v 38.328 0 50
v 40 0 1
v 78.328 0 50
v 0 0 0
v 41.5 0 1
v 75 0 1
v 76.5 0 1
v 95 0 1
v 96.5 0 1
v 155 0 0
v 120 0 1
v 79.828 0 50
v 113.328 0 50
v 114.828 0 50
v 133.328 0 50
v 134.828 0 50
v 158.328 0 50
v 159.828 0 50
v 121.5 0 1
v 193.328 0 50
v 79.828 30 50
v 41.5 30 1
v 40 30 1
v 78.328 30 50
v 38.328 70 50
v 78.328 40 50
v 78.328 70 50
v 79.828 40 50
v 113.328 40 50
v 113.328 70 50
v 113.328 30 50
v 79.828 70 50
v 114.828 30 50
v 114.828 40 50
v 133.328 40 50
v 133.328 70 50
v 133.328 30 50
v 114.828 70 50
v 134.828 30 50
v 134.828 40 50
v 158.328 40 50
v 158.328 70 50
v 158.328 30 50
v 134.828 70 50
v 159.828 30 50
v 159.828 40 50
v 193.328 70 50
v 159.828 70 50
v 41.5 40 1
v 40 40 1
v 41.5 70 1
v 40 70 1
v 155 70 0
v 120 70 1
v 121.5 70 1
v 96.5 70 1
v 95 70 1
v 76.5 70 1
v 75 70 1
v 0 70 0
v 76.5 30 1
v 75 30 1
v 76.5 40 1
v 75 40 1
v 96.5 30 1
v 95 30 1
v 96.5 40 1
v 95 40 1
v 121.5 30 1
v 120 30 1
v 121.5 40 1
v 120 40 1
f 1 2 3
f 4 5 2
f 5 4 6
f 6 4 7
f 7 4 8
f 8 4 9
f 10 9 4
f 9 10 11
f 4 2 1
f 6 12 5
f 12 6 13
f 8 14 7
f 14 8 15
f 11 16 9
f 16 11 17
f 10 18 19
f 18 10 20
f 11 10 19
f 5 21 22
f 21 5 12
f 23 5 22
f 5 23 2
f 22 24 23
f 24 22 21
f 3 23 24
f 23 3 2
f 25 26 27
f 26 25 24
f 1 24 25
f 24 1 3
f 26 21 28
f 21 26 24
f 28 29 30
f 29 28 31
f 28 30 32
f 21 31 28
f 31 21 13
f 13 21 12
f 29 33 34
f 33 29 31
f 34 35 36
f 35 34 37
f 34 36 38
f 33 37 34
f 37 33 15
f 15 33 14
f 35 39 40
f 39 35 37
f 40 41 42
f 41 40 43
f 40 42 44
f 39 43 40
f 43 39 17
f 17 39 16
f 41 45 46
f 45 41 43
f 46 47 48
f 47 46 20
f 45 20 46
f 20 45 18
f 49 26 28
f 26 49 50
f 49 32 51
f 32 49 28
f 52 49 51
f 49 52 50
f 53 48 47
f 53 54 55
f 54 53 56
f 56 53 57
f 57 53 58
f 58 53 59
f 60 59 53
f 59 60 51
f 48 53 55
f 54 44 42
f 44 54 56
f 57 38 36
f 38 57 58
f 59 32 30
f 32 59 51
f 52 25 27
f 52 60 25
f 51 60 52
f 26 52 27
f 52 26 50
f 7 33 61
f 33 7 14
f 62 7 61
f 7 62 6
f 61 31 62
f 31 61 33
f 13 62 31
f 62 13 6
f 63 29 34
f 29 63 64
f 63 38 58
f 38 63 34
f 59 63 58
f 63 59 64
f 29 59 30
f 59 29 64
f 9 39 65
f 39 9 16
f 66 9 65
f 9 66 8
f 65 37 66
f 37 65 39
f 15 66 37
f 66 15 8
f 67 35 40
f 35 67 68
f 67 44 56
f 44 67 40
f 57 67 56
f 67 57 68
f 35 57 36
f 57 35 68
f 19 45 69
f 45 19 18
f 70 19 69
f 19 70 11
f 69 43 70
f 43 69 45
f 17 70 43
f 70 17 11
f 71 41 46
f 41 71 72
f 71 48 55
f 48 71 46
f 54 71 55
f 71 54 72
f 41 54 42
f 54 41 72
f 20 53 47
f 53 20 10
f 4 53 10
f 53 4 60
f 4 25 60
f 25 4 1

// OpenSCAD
//number of division
d=5;//[1:1,2:2,3:3,4:4,5:5,6:6,7:7]
//type of box ending 
final=1;//[1:angled,2:vertical]
//type of box front
front=1;//[1:angled,2:vertical]
//Distance between divisions
e=10;
//Space from box and division height
t=0;
//box Height
H=50;
//Card height (hypotenusa)
C=63;
//Box Width
W=70;
//Length of the 1st division
X1=40;
//Length of the 2nd division
X2=35;
//Length of the 3rd division
X3=20;
//Length of the 4th division
X4=25;
//Length of the 5th division
X5=35;
//Length of the 6th division
X6=40;
//Length of the 7th division
X7=25;


B=sqrt(pow(C,2)-pow(H,2));


module division(P1,H1,t1,C1,W1,e1)
{
    Cn=((H1-t1)*C1)/H1;
    Bd=sqrt(pow((Cn),2)-pow((H-t),2));
    Alt_div=(W1-e1)/2;
    posdiv=(W1+e1)/2;
    linear_extrude(height = Alt_div){
    polygon([[P1,1],[P1+1.5,1],[P1+1.5+Bd,H1-t1],[P1+Bd,H1-t1]]);
    }
    translate([0,0,posdiv]){
        linear_extrude(height = Alt_div){
        polygon([[P1,1],[P1+1.5,1],[P1+1.5+Bd,H1-t1],[P1+Bd,H1-t1]]);
        }
    }
}

if (d==1)
{
   L=X1;
   mirror ([0,1,0]){
   rotate ([90,0,0]) {
        difference() {
                linear_extrude(height = W){
                    if (final==1)
                    {
                        if (front==1)
                            {polygon([[0,0],[L,0],[L+B,H],[B,H]]);}
                        else
                            {polygon([[0,0],[L,0],[L+B,H],[0,H]]);}
                            }
                    else
                    {
                        if (front==1)
                            {polygon([[0,0],[L+B,0],[L+B,H],[B,H]]);}
                        else
                            {polygon([[0,0],[L+B,0],[L+B,H],[0,H]]);}
                            }
                }
               if (final==2) division (X1,H,t,C,W,e);    
            }
        }
    }
}

if (d==2)
{
   L=X1+X2;
    mirror ([0,1,0]){
   rotate ([90,0,0]) {
        difference() {
                linear_extrude(height = W){
                    if (final==1)
                    {
                        if (front==1)
                            {polygon([[0,0],[L,0],[L+B,H],[B,H]]);}
                        else
                            {polygon([[0,0],[L,0],[L+B,H],[0,H]]);}
                            }
                    else
                    {
                        if (front==1)
                            {polygon([[0,0],[L+B,0],[L+B,H],[B,H]]);}
                        else
                            {polygon([[0,0],[L+B,0],[L+B,H],[0,H]]);}
                            }
                }
                division (X1,H,t,C,W,e);
                if (final==2) division (X1+X2,H,t,C,W,e);               
                }

            }
        }
    }

if (d==3)
{
    L=X1+X2+X3;
   mirror ([0,1,0]){
   rotate ([90,0,0]) {
        difference() {
                linear_extrude(height = W){
                    if (final==1)
                    {
                        if (front==1)
                            {polygon([[0,0],[L,0],[L+B,H],[B,H]]);}
                        else
                            {polygon([[0,0],[L,0],[L+B,H],[0,H]]);}
                            }
                    else
                    {
                        if (front==1)
                            {polygon([[0,0],[L+B,0],[L+B,H],[B,H]]);}
                        else
                            {polygon([[0,0],[L+B,0],[L+B,H],[0,H]]);}
                            }
                }
                    division (X1,H,t,C,W,e);
                    division (X1+X2,H,t,C,W,e);
                    if (final==2) division (X1+X2+X3,H,t,C,W,e);        
                }
            }
        }    
}

if (d==4)
{
    L=X1+X2+X3+X4;
       mirror ([0,1,0]){
   rotate ([90,0,0]) {
        difference() {
                linear_extrude(height = W){
                    if (final==1)
                    {
                        if (front==1)
                            {polygon([[0,0],[L,0],[L+B,H],[B,H]]);}
                        else
                            {polygon([[0,0],[L,0],[L+B,H],[0,H]]);}
                            }
                    else
                    {
                        if (front==1)
                            {polygon([[0,0],[L+B,0],[L+B,H],[B,H]]);}
                        else
                            {polygon([[0,0],[L+B,0],[L+B,H],[0,H]]);}
                            }
                }
                    division (X1,H,t,C,W,e);
                    division (X1+X2,H,t,C,W,e);
                    division (X1+X2+X3,H,t,C,W,e);
                    if (final==2) division (X1+X2+X3+X4,H,t,C,W,e);               
                }
            }
        } 
}

if (d==5)
{
    L=X1+X2+X3+X4+X5;
       mirror ([0,1,0]){
   rotate ([90,0,0]) {
        difference() {
                linear_extrude(height = W){
                    if (final==1)
                    {
                        if (front==1)
                            {polygon([[0,0],[L,0],[L+B,H],[B,H]]);}
                        else
                            {polygon([[0,0],[L,0],[L+B,H],[0,H]]);}
                            }
                    else
                    {
                        if (front==1)
                            {polygon([[0,0],[L+B,0],[L+B,H],[B,H]]);}
                        else
                            {polygon([[0,0],[L+B,0],[L+B,H],[0,H]]);}
                            }
                }
                    division (X1,H,t,C,W,e);
                    division (X1+X2,H,t,C,W,e);
                    division (X1+X2+X3,H,t,C,W,e);
                    division (X1+X2+X3+X4,H,t,C,W,e);                if (final==2) division (X1+X2+X3+X4+X5,H,t,C,W,e);  
                
                }
            }
        }     
}

if (d==6)
{
    L=X1+X2+X3+X4+X5+X6;
       mirror ([0,1,0]){
   rotate ([90,0,0]) {
        difference() {
                linear_extrude(height = W){
                    if (final==1)
                    {
                        if (front==1)
                            {polygon([[0,0],[L,0],[L+B,H],[B,H]]);}
                        else
                            {polygon([[0,0],[L,0],[L+B,H],[0,H]]);}
                            }
                    else
                    {
                        if (front==1)
                            {polygon([[0,0],[L+B,0],[L+B,H],[B,H]]);}
                        else
                            {polygon([[0,0],[L+B,0],[L+B,H],[0,H]]);}
                            }
                }
                    division (X1,H,t,C,W,e);
                    division (X1+X2,H,t,C,W,e);
                    division (X1+X2+X3,H,t,C,W,e);
                    division (X1+X2+X3+X4,H,t,C,W,e);
                    division (X1+X2+X3+X4+X5,H,t,C,W,e);                if (final==2) division (X1+X2+X3+X4+X5+X6,H,t,C,W,e);                
                }
            }
        }     
}

if (d==7)
{
    L=X1+X2+X3+X4+X5+X6+X7;
       mirror ([0,1,0]){
   rotate ([90,0,0]) {
        difference() {
                linear_extrude(height = W){
                    if (final==1)
                    {
                        if (front==1)
                            {polygon([[0,0],[L,0],[L+B,H],[B,H]]);}
                        else
                            {polygon([[0,0],[L,0],[L+B,H],[0,H]]);}
                            }
                    else
                    {
                        if (front==1)
                            {polygon([[0,0],[L+B,0],[L+B,H],[B,H]]);}
                        else
                            {polygon([[0,0],[L+B,0],[L+B,H],[0,H]]);}
                            }
                }
                    division (X1,H,t,C,W,e);
                    division (X1+X2,H,t,C,W,e);
                    division (X1+X2+X3,H,t,C,W,e);
                    division (X1+X2+X3+X4,H,t,C,W,e);
                    division (X1+X2+X3+X4+X5,H,t,C,W,e);
                    division (X1+X2+X3+X4+X5+X6,H,t,C,W,e);                if (final==2) division (X1+X2+X3+X4+X5+X6+X7,H,t,C,W,e);                
                }
            }
        }     
}
